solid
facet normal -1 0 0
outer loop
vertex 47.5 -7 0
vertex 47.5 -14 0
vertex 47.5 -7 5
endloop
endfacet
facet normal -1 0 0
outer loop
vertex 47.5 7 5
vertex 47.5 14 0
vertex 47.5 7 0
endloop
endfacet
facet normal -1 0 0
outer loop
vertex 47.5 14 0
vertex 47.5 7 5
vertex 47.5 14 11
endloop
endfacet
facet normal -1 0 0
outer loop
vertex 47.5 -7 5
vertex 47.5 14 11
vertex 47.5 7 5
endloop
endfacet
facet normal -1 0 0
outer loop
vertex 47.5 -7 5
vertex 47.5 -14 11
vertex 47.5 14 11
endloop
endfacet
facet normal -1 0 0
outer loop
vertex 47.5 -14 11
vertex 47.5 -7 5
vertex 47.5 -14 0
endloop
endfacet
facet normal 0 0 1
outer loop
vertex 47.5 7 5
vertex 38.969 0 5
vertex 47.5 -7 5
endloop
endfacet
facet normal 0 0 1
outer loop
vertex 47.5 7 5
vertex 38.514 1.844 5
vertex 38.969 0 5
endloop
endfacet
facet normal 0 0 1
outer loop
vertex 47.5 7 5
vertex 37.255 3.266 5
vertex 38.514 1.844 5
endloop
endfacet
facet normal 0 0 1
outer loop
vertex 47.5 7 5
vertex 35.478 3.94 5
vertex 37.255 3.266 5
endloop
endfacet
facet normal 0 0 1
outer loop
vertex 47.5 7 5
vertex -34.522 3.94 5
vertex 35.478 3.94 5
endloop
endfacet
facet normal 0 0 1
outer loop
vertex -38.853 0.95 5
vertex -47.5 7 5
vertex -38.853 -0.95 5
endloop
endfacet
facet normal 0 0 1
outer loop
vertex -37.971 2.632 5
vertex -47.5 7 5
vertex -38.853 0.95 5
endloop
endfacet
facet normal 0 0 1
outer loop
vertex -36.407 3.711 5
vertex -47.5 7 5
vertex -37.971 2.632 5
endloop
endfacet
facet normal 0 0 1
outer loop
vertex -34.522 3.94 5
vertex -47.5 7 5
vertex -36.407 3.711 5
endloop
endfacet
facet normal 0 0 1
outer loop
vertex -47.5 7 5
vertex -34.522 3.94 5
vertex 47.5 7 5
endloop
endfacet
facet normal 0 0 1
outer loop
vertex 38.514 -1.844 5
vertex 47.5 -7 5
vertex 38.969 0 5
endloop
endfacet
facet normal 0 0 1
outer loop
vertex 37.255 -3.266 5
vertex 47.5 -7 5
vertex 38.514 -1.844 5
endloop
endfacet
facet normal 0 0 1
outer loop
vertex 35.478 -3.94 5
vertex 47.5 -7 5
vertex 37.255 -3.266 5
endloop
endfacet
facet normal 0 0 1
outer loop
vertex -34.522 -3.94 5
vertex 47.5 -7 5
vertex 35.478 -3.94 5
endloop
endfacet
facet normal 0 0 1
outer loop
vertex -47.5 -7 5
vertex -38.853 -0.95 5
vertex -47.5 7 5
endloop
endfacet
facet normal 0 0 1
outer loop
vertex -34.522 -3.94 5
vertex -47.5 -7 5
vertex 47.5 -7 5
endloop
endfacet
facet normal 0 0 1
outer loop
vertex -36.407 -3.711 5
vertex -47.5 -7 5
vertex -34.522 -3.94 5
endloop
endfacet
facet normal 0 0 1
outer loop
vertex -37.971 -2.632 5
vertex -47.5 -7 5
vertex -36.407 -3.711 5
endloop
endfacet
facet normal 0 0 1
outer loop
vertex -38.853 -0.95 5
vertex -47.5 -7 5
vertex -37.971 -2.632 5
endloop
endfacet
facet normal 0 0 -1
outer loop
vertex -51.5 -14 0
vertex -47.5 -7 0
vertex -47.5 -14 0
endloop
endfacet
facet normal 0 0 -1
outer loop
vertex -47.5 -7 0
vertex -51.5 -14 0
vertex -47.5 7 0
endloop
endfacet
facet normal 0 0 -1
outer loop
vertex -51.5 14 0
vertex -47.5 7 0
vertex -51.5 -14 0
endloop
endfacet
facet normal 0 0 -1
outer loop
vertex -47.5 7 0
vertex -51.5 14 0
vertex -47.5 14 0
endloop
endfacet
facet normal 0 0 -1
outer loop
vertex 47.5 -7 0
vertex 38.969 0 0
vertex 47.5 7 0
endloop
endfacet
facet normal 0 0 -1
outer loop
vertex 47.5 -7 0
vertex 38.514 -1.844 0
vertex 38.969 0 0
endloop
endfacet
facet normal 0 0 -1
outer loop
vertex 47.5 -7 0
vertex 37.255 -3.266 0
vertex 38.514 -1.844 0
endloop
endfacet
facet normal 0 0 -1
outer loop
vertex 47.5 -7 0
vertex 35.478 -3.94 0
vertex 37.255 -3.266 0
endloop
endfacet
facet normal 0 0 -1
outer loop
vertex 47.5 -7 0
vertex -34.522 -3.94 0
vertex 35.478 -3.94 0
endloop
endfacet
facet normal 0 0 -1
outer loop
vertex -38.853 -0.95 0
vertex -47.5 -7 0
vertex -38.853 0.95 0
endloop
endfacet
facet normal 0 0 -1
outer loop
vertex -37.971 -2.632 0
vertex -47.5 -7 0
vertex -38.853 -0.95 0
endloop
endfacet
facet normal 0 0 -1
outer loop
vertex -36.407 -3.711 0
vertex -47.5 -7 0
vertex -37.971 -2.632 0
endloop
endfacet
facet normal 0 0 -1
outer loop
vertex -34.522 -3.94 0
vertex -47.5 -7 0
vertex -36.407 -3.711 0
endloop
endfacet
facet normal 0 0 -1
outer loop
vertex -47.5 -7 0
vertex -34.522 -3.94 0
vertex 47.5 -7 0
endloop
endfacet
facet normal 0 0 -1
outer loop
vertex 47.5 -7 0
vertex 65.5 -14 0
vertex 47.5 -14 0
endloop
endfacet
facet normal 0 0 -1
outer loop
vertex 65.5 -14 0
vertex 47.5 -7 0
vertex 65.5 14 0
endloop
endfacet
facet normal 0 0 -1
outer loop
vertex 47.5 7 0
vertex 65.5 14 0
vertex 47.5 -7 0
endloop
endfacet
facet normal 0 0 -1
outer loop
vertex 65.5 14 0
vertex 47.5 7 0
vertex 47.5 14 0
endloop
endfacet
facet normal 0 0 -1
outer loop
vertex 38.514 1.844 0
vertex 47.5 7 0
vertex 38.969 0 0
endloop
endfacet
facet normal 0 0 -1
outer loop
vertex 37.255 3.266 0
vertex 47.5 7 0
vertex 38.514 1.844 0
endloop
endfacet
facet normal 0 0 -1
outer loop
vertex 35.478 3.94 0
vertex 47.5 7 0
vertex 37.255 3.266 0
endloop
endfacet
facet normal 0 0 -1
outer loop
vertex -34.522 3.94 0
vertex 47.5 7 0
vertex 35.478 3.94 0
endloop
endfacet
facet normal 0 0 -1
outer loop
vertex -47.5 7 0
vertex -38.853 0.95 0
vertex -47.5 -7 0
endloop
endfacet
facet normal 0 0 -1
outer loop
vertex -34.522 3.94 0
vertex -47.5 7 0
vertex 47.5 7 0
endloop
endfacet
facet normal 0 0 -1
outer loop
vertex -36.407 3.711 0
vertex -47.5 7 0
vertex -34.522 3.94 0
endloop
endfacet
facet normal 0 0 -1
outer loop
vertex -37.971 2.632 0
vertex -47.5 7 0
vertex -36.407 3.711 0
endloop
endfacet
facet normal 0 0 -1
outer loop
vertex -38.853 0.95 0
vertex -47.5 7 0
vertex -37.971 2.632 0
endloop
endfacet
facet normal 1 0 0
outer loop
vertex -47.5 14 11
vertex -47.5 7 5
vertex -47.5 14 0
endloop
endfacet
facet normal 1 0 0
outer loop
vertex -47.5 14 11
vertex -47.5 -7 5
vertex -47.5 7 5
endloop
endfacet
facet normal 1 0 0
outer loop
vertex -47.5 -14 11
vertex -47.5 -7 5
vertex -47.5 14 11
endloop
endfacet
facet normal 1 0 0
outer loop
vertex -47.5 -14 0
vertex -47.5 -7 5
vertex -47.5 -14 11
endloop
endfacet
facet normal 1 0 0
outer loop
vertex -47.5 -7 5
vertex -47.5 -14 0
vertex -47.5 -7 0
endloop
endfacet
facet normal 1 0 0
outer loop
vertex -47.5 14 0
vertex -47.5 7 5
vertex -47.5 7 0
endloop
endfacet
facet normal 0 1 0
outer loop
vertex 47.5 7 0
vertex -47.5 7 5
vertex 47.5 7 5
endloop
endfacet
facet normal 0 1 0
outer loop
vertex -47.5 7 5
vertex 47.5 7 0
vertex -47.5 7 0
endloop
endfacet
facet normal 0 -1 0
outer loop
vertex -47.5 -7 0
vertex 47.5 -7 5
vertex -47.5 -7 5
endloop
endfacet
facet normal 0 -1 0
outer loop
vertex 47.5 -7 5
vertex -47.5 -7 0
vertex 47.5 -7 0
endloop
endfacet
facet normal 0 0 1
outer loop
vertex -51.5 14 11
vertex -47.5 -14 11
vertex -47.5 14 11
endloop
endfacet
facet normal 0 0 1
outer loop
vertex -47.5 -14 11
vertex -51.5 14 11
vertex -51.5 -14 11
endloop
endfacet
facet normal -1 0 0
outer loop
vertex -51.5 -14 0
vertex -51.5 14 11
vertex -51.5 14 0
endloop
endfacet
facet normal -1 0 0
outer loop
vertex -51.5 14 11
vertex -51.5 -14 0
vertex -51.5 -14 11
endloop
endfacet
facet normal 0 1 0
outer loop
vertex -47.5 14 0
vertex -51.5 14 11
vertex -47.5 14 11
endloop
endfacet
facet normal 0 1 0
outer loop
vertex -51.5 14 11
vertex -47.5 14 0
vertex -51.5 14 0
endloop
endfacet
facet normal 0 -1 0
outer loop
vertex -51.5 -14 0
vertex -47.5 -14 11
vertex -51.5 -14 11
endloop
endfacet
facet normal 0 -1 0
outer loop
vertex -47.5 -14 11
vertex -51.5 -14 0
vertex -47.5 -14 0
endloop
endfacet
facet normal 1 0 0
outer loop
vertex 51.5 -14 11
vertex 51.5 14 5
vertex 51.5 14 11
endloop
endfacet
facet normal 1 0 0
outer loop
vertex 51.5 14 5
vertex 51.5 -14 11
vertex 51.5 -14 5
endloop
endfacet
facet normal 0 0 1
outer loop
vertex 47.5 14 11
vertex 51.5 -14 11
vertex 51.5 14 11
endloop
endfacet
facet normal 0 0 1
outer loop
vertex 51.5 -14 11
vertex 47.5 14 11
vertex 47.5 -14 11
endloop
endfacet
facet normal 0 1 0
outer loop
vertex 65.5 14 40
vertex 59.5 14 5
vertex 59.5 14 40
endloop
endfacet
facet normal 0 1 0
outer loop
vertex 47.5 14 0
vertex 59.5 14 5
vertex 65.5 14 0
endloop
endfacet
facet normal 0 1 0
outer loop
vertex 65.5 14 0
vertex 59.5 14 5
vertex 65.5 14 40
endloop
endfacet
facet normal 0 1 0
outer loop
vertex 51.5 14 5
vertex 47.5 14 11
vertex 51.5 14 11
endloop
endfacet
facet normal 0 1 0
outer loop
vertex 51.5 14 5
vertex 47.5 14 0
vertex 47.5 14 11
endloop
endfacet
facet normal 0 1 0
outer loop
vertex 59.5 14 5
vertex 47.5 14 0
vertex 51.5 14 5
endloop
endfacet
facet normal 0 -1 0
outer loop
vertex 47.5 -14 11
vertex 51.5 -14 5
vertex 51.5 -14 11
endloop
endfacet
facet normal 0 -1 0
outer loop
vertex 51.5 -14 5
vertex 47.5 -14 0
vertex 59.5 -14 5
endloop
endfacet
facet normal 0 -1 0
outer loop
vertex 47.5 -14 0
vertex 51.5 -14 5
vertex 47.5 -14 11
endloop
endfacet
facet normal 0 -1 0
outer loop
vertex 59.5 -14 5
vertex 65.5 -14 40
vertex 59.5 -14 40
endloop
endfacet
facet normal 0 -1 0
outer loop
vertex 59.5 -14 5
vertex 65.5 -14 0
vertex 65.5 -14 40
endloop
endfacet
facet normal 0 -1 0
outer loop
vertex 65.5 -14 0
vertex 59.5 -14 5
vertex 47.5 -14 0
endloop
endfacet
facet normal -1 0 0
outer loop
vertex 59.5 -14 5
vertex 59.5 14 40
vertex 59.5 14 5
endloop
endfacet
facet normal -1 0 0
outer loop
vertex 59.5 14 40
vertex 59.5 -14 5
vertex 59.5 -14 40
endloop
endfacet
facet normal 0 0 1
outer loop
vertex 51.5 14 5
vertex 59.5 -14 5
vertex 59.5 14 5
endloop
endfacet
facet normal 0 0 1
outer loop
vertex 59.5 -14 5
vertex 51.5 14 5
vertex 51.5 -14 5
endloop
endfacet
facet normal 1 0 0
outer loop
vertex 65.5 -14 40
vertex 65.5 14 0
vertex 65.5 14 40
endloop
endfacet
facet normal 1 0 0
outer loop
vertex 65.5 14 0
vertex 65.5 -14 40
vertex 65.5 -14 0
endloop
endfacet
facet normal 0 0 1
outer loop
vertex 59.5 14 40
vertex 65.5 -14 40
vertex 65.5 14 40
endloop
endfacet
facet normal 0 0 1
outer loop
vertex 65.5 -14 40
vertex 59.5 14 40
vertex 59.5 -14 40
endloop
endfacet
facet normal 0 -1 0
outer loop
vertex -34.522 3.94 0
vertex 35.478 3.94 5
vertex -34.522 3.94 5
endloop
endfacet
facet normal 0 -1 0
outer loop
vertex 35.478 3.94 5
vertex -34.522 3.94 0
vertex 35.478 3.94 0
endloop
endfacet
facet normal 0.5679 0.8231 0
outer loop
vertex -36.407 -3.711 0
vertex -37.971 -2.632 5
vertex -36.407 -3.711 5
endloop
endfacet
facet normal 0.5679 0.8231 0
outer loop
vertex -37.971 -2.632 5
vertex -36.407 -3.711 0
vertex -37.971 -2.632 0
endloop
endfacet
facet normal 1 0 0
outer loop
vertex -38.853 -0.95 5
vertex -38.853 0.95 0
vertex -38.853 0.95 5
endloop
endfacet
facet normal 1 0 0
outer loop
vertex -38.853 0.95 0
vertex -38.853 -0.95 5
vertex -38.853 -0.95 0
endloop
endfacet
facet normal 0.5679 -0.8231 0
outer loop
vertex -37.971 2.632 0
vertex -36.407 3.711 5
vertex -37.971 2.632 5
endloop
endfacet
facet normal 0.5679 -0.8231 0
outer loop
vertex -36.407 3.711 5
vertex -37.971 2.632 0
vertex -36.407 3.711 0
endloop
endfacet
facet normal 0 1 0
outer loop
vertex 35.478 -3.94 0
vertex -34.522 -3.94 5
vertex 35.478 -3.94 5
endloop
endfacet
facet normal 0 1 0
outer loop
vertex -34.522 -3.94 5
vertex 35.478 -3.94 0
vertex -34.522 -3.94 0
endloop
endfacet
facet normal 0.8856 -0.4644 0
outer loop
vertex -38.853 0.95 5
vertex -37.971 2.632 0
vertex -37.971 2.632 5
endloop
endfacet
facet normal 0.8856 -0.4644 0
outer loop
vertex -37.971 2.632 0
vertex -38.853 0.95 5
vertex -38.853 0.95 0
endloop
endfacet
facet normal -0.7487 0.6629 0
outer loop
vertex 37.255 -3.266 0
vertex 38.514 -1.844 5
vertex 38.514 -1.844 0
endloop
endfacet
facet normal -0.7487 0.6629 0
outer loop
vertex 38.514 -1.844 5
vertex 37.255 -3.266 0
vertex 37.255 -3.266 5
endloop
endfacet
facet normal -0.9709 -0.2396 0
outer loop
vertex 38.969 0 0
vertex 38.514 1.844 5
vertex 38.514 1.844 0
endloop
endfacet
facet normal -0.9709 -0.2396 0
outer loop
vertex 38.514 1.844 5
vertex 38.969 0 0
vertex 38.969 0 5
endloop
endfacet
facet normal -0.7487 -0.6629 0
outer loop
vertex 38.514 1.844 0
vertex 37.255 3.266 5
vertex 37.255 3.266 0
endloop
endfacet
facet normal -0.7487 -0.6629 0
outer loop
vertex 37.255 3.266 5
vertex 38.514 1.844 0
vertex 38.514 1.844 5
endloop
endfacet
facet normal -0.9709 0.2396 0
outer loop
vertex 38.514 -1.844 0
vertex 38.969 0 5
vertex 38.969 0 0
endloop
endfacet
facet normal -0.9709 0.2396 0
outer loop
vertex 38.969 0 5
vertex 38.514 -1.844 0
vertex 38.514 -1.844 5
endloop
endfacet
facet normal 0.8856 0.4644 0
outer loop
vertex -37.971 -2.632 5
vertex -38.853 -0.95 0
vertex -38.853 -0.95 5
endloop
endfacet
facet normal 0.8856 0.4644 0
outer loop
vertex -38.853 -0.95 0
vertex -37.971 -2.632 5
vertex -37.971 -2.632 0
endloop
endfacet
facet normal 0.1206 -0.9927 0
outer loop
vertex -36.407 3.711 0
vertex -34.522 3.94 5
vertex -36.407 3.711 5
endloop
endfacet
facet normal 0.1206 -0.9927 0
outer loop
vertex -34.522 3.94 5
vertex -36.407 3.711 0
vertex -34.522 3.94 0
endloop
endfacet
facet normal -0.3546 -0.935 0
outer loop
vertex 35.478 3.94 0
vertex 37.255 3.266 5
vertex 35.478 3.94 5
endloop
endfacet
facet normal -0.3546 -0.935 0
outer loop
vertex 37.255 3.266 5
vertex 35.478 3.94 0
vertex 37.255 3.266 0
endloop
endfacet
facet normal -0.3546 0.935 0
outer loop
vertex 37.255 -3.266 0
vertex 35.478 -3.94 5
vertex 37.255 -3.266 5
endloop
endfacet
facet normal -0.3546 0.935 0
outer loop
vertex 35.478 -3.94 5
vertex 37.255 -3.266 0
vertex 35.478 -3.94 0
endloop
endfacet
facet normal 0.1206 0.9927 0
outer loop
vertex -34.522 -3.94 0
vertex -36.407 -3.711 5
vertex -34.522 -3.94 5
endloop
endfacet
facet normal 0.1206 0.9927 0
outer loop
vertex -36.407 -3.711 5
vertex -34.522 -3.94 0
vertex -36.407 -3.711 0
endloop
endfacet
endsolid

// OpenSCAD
// file: constants.scad
/* sinusoid-plotter: A parametric sinusoid plotter made with OpenSCAD.
 * Copyright (C) 2013  Clayton G. Hobbs
 * 
 * This program is free software: you can redistribute it and/or modify
 * it under the terms of the GNU General Public License as published by
 * the Free Software Foundation, either version 3 of the License, or
 * (at your option) any later version.
 * 
 * This program is distributed in the hope that it will be useful,
 * but WITHOUT ANY WARRANTY; without even the implied warranty of
 * MERCHANTABILITY or FITNESS FOR A PARTICULAR PURPOSE.  See the
 * GNU General Public License for more details.
 * 
 * You should have received a copy of the GNU General Public License
 * along with this program.  If not, see <http://www.gnu.org/licenses/>.
 */

pi = 3.1415926535897932384626433832795;
// main file
/* sinusoid-plotter: A parametric sinusoid plotter made with OpenSCAD.
 * Copyright (C) 2013  Clayton G. Hobbs
 * 
 * This program is free software: you can redistribute it and/or modify
 * it under the terms of the GNU General Public License as published by
 * the Free Software Foundation, either version 3 of the License, or
 * (at your option) any later version.
 * 
 * This program is distributed in the hope that it will be useful,
 * but WITHOUT ANY WARRANTY; without even the implied warranty of
 * MERCHANTABILITY or FITNESS FOR A PARTICULAR PURPOSE.  See the
 * GNU General Public License for more details.
 * 
 * You should have received a copy of the GNU General Public License
 * along with this program.  If not, see <http://www.gnu.org/licenses/>.
 */

include <constants.scad>;

module slider(sin_size, slide_size, slot_radius, slot_length, ext_length,
              clip_edge)
{
	difference() {
		union() {
			translate([-sin_size[0]/2, -sin_size[1]/2, 0])
			cube(sin_size);

			translate([-sin_size[0]/2 - slide_size[0], -slide_size[1]/2, 0])
			cube(slide_size);

			translate([sin_size[0]/2, -slide_size[1]/2, 0])
			cube(slide_size);

			translate([sin_size[0]/2 + slide_size[0], -slide_size[1]/2, 0])
			cube([ext_length, slide_size[1], sin_size[2]]);

			translate([sin_size[0]/2 + slide_size[0] + ext_length,
                      -slide_size[1]/2, 0])
			cube([clip_edge[0], slide_size[1], clip_edge[1]]);
		}

		hull() {
			translate([-slot_length/2, 0, -1])
			cylinder(r = slot_radius, h = sin_size[2] + 2);

			translate([slot_length/2, 0, -1])
			cylinder(r = slot_radius, h = sin_size[2] + 2);
		}
	}
}

slider(sin_size = [95, 14, 5], slide_size = [4, 28, 11], slot_radius = 3.96875,
       slot_length = 70, ext_length = 8, clip_edge = [6, 40]);
